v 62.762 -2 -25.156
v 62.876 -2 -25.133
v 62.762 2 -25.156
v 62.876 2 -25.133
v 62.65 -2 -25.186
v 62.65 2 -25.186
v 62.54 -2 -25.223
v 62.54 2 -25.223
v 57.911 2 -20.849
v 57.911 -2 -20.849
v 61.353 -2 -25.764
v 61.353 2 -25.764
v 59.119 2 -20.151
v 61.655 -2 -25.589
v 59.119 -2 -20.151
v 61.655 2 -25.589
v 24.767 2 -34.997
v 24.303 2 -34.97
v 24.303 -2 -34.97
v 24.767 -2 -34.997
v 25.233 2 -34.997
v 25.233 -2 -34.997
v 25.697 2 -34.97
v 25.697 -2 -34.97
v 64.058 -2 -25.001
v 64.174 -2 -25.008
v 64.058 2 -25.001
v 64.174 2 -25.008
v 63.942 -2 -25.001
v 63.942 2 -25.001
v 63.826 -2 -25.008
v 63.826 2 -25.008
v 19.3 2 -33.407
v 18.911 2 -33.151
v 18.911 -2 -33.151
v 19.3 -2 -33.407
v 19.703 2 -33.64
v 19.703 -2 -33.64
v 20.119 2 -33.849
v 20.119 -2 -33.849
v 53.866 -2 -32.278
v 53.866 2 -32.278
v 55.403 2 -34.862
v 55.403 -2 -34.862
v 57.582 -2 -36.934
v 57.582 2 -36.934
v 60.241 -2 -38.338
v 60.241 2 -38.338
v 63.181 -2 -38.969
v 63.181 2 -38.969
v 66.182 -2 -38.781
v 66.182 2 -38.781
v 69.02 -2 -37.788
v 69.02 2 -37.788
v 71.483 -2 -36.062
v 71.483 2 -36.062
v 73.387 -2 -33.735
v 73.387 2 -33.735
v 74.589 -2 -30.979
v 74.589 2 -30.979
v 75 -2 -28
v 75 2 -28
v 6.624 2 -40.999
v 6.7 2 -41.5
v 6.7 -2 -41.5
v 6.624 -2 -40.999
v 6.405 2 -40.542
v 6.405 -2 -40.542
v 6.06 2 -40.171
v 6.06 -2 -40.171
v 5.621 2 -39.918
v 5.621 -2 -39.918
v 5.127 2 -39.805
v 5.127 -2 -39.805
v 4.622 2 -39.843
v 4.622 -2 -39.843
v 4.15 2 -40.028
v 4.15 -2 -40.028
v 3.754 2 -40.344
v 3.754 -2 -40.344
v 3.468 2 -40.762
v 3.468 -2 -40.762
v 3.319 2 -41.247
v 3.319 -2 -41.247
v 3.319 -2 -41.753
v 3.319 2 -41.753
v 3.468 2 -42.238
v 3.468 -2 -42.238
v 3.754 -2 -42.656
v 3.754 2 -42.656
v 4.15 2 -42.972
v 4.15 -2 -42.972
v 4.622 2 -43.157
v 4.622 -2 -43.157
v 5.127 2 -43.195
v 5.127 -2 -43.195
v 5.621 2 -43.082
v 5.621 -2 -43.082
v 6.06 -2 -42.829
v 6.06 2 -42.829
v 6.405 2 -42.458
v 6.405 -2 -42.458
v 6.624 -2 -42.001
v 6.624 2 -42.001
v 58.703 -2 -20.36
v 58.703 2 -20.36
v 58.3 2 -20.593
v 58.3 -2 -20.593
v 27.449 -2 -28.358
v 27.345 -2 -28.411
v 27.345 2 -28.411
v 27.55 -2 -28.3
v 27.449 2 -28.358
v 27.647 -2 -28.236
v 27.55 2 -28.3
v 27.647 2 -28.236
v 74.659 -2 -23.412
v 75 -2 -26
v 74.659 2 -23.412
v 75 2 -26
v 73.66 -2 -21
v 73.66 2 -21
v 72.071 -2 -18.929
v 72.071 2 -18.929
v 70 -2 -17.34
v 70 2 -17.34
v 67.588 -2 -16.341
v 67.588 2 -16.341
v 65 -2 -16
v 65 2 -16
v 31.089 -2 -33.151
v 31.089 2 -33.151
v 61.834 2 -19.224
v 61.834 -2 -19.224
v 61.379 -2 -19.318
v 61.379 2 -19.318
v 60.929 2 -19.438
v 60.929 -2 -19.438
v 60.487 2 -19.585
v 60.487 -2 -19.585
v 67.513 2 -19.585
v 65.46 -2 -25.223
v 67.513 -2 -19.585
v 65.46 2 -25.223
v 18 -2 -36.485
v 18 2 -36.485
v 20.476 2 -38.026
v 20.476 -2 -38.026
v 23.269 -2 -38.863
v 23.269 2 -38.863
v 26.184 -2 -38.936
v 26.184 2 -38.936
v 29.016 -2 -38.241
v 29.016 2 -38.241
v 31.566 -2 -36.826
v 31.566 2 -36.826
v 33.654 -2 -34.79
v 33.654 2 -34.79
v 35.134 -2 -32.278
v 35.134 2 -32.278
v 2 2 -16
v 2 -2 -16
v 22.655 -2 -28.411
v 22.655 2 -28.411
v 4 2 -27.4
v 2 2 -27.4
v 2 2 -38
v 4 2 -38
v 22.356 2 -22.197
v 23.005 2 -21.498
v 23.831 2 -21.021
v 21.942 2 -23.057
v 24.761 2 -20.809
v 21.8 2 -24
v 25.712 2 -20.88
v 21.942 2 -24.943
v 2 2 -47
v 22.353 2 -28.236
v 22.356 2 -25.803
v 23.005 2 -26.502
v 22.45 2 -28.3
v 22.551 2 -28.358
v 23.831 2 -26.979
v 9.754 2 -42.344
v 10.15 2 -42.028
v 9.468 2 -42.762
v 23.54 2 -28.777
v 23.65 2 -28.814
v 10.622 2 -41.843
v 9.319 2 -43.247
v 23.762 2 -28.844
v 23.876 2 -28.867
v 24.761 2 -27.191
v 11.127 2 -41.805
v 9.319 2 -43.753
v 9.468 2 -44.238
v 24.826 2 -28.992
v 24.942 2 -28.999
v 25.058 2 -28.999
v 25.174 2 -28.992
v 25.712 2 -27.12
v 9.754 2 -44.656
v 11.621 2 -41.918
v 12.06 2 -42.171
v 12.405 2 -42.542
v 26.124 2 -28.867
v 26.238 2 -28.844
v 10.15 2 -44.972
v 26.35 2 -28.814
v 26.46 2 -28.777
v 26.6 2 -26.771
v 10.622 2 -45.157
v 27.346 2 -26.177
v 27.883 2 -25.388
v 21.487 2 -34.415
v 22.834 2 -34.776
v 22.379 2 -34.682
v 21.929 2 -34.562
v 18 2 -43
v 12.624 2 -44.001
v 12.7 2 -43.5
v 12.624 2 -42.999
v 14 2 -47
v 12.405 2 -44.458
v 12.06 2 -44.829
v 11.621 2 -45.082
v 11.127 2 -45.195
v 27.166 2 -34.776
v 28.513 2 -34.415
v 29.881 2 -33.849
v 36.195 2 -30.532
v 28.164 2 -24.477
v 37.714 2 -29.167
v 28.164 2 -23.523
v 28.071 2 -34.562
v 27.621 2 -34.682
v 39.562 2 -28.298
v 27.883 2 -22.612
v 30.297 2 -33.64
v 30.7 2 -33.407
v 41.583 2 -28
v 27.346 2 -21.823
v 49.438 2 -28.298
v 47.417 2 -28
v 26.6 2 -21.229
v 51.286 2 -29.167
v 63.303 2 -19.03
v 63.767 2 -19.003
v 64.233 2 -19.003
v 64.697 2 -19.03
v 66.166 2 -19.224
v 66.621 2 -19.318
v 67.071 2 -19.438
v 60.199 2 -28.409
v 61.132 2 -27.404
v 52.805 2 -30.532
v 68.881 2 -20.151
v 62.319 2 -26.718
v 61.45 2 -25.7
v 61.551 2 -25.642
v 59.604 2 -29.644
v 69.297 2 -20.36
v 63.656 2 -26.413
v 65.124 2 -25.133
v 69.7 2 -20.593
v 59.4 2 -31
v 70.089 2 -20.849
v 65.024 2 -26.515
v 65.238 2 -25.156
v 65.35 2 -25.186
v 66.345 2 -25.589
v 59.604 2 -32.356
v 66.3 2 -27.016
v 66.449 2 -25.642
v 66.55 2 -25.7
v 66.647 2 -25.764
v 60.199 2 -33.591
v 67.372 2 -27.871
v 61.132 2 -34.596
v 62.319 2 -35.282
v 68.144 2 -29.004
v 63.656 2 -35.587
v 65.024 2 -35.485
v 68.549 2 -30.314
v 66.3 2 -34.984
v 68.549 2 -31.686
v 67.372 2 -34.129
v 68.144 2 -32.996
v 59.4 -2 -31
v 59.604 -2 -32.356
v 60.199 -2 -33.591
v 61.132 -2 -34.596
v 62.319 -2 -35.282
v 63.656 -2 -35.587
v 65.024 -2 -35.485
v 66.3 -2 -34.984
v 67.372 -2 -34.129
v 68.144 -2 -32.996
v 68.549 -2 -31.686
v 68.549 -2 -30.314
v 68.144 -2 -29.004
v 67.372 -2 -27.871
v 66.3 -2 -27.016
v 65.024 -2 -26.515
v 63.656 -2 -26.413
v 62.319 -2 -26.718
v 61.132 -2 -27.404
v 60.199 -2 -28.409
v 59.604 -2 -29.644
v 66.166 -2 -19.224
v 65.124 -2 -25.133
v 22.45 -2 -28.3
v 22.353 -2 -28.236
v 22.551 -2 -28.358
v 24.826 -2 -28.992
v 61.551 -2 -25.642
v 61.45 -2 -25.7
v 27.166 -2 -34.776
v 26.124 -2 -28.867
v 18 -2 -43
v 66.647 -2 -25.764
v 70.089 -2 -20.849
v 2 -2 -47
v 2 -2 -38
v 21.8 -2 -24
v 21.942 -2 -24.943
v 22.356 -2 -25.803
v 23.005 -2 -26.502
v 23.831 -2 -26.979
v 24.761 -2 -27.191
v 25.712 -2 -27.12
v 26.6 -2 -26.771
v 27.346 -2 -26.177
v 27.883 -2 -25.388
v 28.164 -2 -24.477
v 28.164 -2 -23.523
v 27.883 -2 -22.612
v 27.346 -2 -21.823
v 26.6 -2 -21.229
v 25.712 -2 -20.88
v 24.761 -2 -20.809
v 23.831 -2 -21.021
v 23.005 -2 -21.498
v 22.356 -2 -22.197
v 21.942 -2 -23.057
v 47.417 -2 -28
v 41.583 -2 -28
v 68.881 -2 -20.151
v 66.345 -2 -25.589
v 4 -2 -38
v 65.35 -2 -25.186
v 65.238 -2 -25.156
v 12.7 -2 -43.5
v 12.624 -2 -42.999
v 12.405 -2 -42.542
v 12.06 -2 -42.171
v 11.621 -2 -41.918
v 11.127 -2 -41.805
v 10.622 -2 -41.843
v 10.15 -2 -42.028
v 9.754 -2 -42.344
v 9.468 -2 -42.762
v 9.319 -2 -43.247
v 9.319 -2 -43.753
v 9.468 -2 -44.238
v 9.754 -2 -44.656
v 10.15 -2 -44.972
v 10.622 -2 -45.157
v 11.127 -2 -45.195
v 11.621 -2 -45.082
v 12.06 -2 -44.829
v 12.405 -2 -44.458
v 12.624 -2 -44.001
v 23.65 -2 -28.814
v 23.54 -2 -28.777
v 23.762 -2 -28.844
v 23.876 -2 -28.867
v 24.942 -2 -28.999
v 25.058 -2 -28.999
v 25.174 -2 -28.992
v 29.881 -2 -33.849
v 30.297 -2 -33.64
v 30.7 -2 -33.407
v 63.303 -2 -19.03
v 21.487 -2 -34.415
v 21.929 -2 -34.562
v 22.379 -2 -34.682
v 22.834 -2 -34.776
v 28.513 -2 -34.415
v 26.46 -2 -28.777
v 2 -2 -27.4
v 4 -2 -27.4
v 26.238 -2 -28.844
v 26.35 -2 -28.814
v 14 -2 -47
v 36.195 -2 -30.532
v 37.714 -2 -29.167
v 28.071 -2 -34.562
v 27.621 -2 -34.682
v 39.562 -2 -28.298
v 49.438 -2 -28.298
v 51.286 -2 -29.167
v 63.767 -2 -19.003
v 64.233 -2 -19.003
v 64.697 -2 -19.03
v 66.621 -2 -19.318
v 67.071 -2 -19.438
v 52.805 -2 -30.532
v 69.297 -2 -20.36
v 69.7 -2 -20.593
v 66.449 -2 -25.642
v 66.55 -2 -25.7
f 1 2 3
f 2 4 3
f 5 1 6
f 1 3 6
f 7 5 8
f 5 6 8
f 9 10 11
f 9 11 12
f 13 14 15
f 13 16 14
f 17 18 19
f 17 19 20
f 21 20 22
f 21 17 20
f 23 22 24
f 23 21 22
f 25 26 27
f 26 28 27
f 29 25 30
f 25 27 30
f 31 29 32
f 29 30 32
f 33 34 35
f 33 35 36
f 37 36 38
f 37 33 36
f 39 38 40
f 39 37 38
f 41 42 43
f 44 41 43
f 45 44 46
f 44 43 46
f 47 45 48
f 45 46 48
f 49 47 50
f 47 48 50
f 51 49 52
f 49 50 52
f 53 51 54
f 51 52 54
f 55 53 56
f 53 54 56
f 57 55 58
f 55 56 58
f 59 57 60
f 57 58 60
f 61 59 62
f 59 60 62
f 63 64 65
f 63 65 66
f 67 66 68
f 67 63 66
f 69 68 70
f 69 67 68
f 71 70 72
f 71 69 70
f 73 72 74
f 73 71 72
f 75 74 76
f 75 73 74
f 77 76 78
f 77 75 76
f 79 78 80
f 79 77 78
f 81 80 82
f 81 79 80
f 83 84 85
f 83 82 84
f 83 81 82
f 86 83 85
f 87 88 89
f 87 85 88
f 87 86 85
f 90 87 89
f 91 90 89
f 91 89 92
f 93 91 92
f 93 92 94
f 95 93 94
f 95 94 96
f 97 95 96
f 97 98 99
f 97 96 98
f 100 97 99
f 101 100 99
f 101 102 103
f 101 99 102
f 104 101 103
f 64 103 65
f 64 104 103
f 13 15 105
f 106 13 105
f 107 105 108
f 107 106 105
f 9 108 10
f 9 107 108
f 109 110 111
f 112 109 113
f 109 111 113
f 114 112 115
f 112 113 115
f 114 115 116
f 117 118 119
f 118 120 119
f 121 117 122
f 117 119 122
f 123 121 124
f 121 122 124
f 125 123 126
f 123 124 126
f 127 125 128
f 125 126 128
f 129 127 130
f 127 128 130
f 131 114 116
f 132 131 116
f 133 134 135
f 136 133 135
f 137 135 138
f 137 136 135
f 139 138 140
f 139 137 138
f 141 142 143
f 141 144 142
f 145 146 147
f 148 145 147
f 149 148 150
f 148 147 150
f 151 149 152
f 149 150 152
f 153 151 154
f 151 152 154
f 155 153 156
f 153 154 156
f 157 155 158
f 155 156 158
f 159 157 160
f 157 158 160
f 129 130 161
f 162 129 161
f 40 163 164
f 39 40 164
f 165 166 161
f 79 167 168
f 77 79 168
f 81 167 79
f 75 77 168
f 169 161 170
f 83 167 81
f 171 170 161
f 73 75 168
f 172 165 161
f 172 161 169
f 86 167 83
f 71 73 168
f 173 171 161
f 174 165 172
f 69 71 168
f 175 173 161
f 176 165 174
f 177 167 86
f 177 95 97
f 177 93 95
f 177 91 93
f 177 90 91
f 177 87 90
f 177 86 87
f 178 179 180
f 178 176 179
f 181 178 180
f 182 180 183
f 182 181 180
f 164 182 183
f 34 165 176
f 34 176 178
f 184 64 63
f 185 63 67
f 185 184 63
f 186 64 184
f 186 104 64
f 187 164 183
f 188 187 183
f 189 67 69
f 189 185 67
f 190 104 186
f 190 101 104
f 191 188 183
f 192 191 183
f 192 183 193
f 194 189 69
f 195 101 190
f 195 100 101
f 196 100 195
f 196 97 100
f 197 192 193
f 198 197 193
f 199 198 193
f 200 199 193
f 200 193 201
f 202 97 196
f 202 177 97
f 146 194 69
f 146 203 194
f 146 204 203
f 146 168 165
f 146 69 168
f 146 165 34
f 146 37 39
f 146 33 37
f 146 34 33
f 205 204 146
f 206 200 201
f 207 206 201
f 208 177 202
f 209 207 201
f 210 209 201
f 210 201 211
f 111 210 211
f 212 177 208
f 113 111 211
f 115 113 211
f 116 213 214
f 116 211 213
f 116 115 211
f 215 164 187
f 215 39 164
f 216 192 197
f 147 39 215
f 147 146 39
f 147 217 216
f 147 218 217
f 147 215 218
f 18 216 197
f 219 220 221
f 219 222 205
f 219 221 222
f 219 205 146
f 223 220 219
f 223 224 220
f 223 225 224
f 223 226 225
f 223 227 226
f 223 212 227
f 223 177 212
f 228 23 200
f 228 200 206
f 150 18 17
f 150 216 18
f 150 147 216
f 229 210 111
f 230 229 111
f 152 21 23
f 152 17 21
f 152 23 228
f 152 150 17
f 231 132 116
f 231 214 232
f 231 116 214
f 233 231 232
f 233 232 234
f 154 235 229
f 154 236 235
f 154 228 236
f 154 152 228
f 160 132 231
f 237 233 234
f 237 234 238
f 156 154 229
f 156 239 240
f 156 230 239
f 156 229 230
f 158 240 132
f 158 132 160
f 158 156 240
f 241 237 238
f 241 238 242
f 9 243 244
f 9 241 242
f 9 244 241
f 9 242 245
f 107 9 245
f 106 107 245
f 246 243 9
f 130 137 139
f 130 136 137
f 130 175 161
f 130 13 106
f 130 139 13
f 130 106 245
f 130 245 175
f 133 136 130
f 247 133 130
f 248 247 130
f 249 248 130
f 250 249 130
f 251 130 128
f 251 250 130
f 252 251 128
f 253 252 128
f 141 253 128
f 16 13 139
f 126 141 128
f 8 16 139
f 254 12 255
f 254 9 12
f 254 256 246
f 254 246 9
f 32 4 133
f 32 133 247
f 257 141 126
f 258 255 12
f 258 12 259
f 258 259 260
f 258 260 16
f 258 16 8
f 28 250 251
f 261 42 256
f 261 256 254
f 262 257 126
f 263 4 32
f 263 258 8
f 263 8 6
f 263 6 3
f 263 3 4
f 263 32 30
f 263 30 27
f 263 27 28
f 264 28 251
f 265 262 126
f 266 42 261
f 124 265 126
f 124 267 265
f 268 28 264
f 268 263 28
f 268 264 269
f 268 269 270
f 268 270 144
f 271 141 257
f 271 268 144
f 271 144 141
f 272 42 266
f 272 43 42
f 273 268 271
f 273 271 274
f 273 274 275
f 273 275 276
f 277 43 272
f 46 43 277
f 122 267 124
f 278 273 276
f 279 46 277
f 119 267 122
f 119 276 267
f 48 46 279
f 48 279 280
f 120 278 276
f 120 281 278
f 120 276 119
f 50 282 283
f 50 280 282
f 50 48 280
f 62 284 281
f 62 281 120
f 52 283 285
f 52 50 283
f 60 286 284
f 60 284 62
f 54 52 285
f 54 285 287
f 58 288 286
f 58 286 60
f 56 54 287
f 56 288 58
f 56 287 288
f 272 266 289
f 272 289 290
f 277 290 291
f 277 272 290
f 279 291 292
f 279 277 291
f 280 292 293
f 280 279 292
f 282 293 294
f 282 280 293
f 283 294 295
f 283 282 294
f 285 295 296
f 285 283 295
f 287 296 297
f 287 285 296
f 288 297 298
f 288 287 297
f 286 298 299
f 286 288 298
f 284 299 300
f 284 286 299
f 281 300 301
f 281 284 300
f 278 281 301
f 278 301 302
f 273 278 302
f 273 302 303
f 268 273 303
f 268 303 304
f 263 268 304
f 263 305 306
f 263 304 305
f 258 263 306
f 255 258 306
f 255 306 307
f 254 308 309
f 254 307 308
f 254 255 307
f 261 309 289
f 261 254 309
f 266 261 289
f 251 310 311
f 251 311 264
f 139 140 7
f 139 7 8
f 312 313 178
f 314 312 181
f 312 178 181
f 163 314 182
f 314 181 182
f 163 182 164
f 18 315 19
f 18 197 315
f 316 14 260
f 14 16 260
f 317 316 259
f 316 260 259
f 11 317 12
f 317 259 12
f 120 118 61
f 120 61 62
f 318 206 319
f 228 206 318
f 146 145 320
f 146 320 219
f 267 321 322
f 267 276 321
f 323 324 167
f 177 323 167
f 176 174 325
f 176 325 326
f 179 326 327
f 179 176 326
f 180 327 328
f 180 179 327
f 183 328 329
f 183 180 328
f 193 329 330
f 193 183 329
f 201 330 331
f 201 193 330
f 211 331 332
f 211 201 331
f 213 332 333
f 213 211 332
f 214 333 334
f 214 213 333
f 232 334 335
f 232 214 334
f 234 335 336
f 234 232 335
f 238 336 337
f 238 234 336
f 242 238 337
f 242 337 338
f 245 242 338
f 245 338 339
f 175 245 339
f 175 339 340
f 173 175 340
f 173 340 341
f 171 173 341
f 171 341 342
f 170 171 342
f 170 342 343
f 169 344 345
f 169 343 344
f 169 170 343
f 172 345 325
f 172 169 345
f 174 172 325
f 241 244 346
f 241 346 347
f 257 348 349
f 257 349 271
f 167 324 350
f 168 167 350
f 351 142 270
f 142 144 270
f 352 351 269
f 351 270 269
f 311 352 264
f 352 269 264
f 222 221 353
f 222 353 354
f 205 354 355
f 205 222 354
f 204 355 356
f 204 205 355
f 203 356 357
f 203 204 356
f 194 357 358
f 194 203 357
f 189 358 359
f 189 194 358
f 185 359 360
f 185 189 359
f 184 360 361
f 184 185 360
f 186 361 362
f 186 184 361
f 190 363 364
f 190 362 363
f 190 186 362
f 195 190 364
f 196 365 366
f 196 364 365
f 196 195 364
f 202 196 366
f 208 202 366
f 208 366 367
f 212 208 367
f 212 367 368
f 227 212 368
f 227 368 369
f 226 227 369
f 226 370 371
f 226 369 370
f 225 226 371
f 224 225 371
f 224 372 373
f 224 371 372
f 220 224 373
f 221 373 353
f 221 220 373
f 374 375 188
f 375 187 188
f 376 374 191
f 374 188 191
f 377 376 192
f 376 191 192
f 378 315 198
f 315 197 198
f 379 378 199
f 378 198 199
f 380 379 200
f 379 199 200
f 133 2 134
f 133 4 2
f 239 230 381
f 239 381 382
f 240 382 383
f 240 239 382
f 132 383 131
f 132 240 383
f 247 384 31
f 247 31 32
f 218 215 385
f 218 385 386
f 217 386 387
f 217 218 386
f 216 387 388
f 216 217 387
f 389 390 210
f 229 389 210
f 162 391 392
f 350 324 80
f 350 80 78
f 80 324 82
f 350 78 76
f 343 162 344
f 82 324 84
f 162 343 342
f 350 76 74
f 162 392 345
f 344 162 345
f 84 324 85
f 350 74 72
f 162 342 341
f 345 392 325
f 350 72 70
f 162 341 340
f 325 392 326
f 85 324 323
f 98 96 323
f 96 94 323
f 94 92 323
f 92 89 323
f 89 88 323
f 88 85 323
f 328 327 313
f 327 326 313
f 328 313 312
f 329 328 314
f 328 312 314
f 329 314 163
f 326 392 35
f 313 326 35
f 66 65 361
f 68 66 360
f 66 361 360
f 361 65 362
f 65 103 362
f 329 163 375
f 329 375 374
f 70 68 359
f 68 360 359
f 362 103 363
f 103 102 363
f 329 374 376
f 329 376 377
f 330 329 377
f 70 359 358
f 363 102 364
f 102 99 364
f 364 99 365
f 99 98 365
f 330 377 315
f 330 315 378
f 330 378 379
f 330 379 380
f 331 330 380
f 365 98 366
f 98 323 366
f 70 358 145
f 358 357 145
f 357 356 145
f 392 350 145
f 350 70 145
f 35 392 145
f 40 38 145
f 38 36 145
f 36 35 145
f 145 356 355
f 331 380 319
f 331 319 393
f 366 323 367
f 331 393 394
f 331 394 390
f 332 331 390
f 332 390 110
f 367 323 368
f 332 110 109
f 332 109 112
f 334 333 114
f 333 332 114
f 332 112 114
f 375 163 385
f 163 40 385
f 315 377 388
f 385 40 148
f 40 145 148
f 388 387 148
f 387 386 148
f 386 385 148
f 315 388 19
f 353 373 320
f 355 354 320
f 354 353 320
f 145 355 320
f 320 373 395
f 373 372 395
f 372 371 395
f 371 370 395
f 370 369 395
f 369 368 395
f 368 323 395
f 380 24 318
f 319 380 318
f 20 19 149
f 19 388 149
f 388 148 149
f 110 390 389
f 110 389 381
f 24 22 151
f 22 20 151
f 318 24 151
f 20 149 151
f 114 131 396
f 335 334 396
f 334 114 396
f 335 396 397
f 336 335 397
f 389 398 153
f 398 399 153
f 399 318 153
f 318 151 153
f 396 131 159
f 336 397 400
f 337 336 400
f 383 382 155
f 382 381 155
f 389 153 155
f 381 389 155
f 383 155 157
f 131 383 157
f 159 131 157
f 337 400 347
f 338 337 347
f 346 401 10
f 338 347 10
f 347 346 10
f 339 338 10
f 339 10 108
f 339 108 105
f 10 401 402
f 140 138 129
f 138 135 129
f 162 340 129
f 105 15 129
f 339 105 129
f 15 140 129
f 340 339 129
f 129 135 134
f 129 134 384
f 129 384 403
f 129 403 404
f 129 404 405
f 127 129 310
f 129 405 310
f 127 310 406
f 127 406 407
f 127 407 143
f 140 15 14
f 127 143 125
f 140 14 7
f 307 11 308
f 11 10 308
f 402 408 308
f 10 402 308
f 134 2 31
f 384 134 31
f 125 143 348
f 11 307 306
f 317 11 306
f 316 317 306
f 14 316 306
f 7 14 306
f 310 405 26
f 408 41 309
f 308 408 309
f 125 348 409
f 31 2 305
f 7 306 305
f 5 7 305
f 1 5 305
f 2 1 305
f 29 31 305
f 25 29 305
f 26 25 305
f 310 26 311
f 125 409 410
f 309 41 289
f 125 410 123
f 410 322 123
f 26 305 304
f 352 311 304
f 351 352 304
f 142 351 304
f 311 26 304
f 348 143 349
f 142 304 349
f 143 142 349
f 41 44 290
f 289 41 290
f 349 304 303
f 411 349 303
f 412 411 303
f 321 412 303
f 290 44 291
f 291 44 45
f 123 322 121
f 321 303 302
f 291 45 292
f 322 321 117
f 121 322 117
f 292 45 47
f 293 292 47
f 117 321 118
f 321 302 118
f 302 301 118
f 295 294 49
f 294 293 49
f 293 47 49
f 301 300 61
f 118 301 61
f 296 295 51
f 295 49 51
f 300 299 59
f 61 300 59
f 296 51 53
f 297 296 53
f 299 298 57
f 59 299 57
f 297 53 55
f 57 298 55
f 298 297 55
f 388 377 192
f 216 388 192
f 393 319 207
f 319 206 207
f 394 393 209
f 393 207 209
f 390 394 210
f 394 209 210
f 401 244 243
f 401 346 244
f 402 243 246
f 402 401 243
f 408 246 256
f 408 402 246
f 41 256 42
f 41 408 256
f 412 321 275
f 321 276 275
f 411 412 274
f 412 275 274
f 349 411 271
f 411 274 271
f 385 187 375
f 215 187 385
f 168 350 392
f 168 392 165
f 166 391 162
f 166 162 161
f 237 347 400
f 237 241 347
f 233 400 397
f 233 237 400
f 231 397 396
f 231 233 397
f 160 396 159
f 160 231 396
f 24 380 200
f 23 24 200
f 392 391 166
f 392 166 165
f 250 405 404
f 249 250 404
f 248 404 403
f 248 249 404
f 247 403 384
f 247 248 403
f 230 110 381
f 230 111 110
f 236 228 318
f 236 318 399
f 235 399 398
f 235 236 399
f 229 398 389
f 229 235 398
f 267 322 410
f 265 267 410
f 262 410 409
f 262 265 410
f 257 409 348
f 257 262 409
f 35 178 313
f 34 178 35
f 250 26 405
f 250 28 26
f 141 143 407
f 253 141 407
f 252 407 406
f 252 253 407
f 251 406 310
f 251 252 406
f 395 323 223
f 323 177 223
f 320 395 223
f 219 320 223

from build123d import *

# Parameters (mm, degrees)
BOX001027008_W            = 15
BOX001027008_H            = 24
BOX001027008_DEPTH        = 10.6
CYLINDER055_R             = 1.7
CYLINDER055_DEPTH         = 20
CYLINDER055_ROLL_ANGLE    = 90
CYLINDER054_R             = 1.7
CYLINDER054_DEPTH         = 20
CYLINDER054_ROLL_ANGLE    = 90
BOX001021_W               = 16
BOX001021_H               = 4
BOX001021_DEPTH           = 19
CHAMFER002_SIZE           = 4
BOX001023_W               = 14
BOX001023_H               = 9
BOX001023_DEPTH           = 22
BOX001015_W               = 13
BOX001015_H               = 10
BOX001015_DEPTH           = 2
BOX001015_PLACEMENT_ANGLE = 80
BOX001014_W               = 2
BOX001014_H               = 10
BOX001014_DEPTH           = 13
CYLINDER040_R             = 2
CYLINDER040_DEPTH         = 13
CYLINDER040_ROLL_ANGLE    = 90
CYLINDER041_R             = 8
CYLINDER041_DEPTH         = 8
CYLINDER041_ROLL_ANGLE    = 90
COMMON006_PLACEMENT_ANGLE = 25
COMMON005_PITCH_ANGLE     = -20
COMMON004_PITCH_ANGLE     = 10
COMMON007_PITCH_ANGLE     = -35
COMMON003_PITCH_ANGLE     = -5
FUSION061_PLACEMENT_ANGLE = 180
CYLINDER042_R             = 4.6
CYLINDER042_DEPTH         = 10
CYLINDER042_ROLL_ANGLE    = 90
CYLINDER039_R             = 3.2
CYLINDER039_DEPTH         = 10
CYLINDER039_ROLL_ANGLE    = 90
CYLINDER037_R             = 11
CYLINDER037_DEPTH         = 4
CYLINDER037_ROLL_ANGLE    = 90
CYLINDER038_R             = 11
CYLINDER038_DEPTH         = 4
CYLINDER038_ROLL_ANGLE    = 90
BOX001013_W               = 80
BOX001013_H               = 4
BOX001013_DEPTH           = 12
FILLET_R                  = 7
FILLET001_R               = 7
FILLET002_R               = 10
FILLET002_PLACEMENT_ANGLE = 180


with BuildPart() as cube028:
    # Box001027008 → Box001027008 (new body)
    with BuildSketch(Plane(origin=(-11, -13, -38), x_dir=(1, 0, 0), z_dir=(0, 0, 1))):
        with Locations((7.5, 12)):
            Rectangle(BOX001027008_W, BOX001027008_H)
    extrude(amount=BOX001027008_DEPTH)


with BuildPart() as cylinder055:
    # Cylinder055 → Cylinder055 (new body)
    with BuildSketch(Plane.XY):
        Circle(CYLINDER055_R)
    extrude(amount=CYLINDER055_DEPTH)


with BuildPart() as cylinder055_1:
    # Cylinder055 roll: moved
    add(cylinder055.part.rotate(Axis((0, 0, 0), (1, 0, 0)), CYLINDER055_ROLL_ANGLE))


with BuildPart() as cylinder055_2:
    # Cylinder055 placement: moved
    add(cylinder055_1.part.moved(Location((5, 10, -41.5))))


with BuildPart() as fusion075:
    # Cylinder054 → Cylinder054 (new body)
    with BuildSketch(Plane.XY):
        Circle(CYLINDER054_R)
    extrude(amount=CYLINDER054_DEPTH)


with BuildPart() as fusion075_1:
    # Cylinder054 roll: moved
    add(fusion075.part.rotate(Axis((0, 0, 0), (1, 0, 0)), CYLINDER054_ROLL_ANGLE))


with BuildPart() as fusion075_2:
    # Cylinder054 placement: moved
    add(fusion075_1.part.moved(Location((11, 10, -43.5))))

    # Fusion075: union Cylinder055
    add(cylinder055_2.part)


with BuildPart() as cut031:
    # Box001021 → Box001021 (new body)
    with BuildSketch(Plane(origin=(2, -2, -47), x_dir=(1, 0, 0), z_dir=(0, 0, 1))):
        with Locations((8, 2)):
            Rectangle(BOX001021_W, BOX001021_H)
    extrude(amount=BOX001021_DEPTH)

    # Chamfer002
    chamfer002_edges = [cut031.edges().sort_by_distance(p)[0] for p in [
        (18, 0, -47),
    ]]
    chamfer(chamfer002_edges, length=CHAMFER002_SIZE)

    # Cut031: cut Fusion075
    add(fusion075_2.part, mode=Mode.SUBTRACT)


with BuildPart() as cube021:
    # Box001023 → Box001023 (new body)
    with BuildSketch(Plane(origin=(-12, -4, -33), x_dir=(1, 0, 0), z_dir=(0, 0, 1))):
        with Locations((7, 4.5)):
            Rectangle(BOX001023_W, BOX001023_H)
    extrude(amount=BOX001023_DEPTH)


with BuildPart() as cube013:
    # Box001015 → Box001015 (new body)
    with BuildSketch(Plane.XY):
        with Locations((6.5, 5)):
            Rectangle(BOX001015_W, BOX001015_H)
    extrude(amount=BOX001015_DEPTH)


with BuildPart() as cube013_1:
    # Box001015 placement: moved
    add(cube013.part.moved(Location((0, -5, 0))).rotate(Axis((0, -5, 0), (0, -1, 0)), BOX001015_PLACEMENT_ANGLE))


with BuildPart() as common002:
    # Box001014 → Box001014 (new body)
    with BuildSketch(Plane(origin=(0, -5, 0), x_dir=(1, 0, 0), z_dir=(0, 0, 1))):
        with Locations((1, 5)):
            Rectangle(BOX001014_W, BOX001014_H)
    extrude(amount=BOX001014_DEPTH)

    # Common002: intersect Cube013
    add(cube013_1.part, mode=Mode.INTERSECT)


with BuildPart() as cylinder040:
    # Cylinder040 → Cylinder040 (new body)
    with BuildSketch(Plane.XY):
        Circle(CYLINDER040_R)
    extrude(amount=CYLINDER040_DEPTH)


with BuildPart() as cylinder040_1:
    # Cylinder040 roll: moved
    add(cylinder040.part.rotate(Axis((0, 0, 0), (1, 0, 0)), CYLINDER040_ROLL_ANGLE))


with BuildPart() as cylinder040_2:
    # Cylinder040 placement: moved
    add(cylinder040_1.part.moved(Location((0, 7, 0))))


with BuildPart() as cut010:
    # Cylinder041 → Cylinder041 (new body)
    with BuildSketch(Plane.XY):
        Circle(CYLINDER041_R)
    extrude(amount=CYLINDER041_DEPTH)


with BuildPart() as cut010_1:
    # Cylinder041 roll: moved
    add(cut010.part.rotate(Axis((0, 0, 0), (1, 0, 0)), CYLINDER041_ROLL_ANGLE))


with BuildPart() as cut010_2:
    # Cylinder041 placement: moved
    add(cut010_1.part.moved(Location((0, 4, 0))))

    # Cut010: cut Cylinder040
    add(cylinder040_2.part, mode=Mode.SUBTRACT)


with BuildPart() as common006:
    # Common006 base: copy of Cut010
    add(cut010_2.part)

    # Common006: intersect Common002
    add(common002.part, mode=Mode.INTERSECT)


with BuildPart() as common006_1:
    # Common006 placement: moved
    add(common006.part.moved(Location((51.5, 0, 10.598076))).rotate(Axis((51.5, 0, 10.598076), (0, 1, 0)), COMMON006_PLACEMENT_ANGLE))


with BuildPart() as common005:
    # Common005 base: copy of Cut010
    add(cut010_2.part)

    # Common005: intersect Common002
    add(common002.part, mode=Mode.INTERSECT)


with BuildPart() as common005_1:
    # Common005 pitch: moved
    add(common005.part.rotate(Axis((0, 0, 0), (0, 1, 0)), COMMON005_PITCH_ANGLE))


with BuildPart() as common005_2:
    # Common005 placement: moved
    add(common005_1.part.moved(Location((49.223543, 0, 10.897777))))


with BuildPart() as common004:
    # Common004 base: copy of Cut010
    add(cut010_2.part)

    # Common004: intersect Common002
    add(common002.part, mode=Mode.INTERSECT)


with BuildPart() as common004_1:
    # Common004 pitch: moved
    add(common004.part.rotate(Axis((0, 0, 0), (0, 1, 0)), COMMON004_PITCH_ANGLE))


with BuildPart() as common004_2:
    # Common004 placement: moved
    add(common004_1.part.moved(Location((50.776457, 0, 10.897777))))


with BuildPart() as common007:
    # Common007 base: copy of Cut010
    add(cut010_2.part)

    # Common007: intersect Common002
    add(common002.part, mode=Mode.INTERSECT)


with BuildPart() as common007_1:
    # Common007 pitch: moved
    add(common007.part.rotate(Axis((0, 0, 0), (0, 1, 0)), COMMON007_PITCH_ANGLE))


with BuildPart() as common007_2:
    # Common007 placement: moved
    add(common007_1.part.moved(Location((48.5, 0, 10.598076))))


with BuildPart() as common003:
    # Common003 base: copy of Cut010
    add(cut010_2.part)

    # Common003: intersect Common002
    add(common002.part, mode=Mode.INTERSECT)


with BuildPart() as common003_1:
    # Common003 pitch: moved
    add(common003.part.rotate(Axis((0, 0, 0), (0, 1, 0)), COMMON003_PITCH_ANGLE))


with BuildPart() as common003_2:
    # Common003 placement: moved
    add(common003_1.part.moved(Location((50, 0, 11))))


with BuildPart() as strength_slots001:
    # Fusion061 base: copy of Common003
    add(common003_2.part)

    # Fusion061: union Common006, Common005, Common004, Common007
    add(common006_1.part)
    add(common005_2.part)
    add(common004_2.part)
    add(common007_2.part)


with BuildPart() as strength_slots001_1:
    # Fusion061 placement: moved
    add(strength_slots001.part.moved(Location((61, 0, 22))).rotate(Axis((61, 0, 22), (0, 1, 0)), FUSION061_PLACEMENT_ANGLE))


with BuildPart() as cylinder042:
    # Cylinder042 → Cylinder042 (new body)
    with BuildSketch(Plane.XY):
        Circle(CYLINDER042_R)
    extrude(amount=CYLINDER042_DEPTH)


with BuildPart() as cylinder042_1:
    # Cylinder042 roll: moved
    add(cylinder042.part.rotate(Axis((0, 0, 0), (1, 0, 0)), CYLINDER042_ROLL_ANGLE))


with BuildPart() as cylinder042_2:
    # Cylinder042 placement: moved
    add(cylinder042_1.part.moved(Location((11, 5, 15))))


with BuildPart() as strength_slots:
    # Fusion060 base: copy of Common003
    add(common003_2.part)

    # Fusion060: union Common006, Common005, Common004, Common007
    add(common006_1.part)
    add(common005_2.part)
    add(common004_2.part)
    add(common007_2.part)


with BuildPart() as cylinder039:
    # Cylinder039 → Cylinder039 (new body)
    with BuildSketch(Plane.XY):
        Circle(CYLINDER039_R)
    extrude(amount=CYLINDER039_DEPTH)


with BuildPart() as cylinder039_1:
    # Cylinder039 roll: moved
    add(cylinder039.part.rotate(Axis((0, 0, 0), (1, 0, 0)), CYLINDER039_ROLL_ANGLE))


with BuildPart() as cylinder039_2:
    # Cylinder039 placement: moved
    add(cylinder039_1.part.moved(Location((50, 5, 8))))


with BuildPart() as cylinder037:
    # Cylinder037 → Cylinder037 (new body)
    with BuildSketch(Plane.XY):
        Circle(CYLINDER037_R)
    extrude(amount=CYLINDER037_DEPTH)


with BuildPart() as cylinder037_1:
    # Cylinder037 roll: moved
    add(cylinder037.part.rotate(Axis((0, 0, 0), (1, 0, 0)), CYLINDER037_ROLL_ANGLE))


with BuildPart() as cylinder037_2:
    # Cylinder037 placement: moved
    add(cylinder037_1.part.moved(Location((11, 2, 12))))


with BuildPart() as cylinder038:
    # Cylinder038 → Cylinder038 (new body)
    with BuildSketch(Plane.XY):
        Circle(CYLINDER038_R)
    extrude(amount=CYLINDER038_DEPTH)


with BuildPart() as cylinder038_1:
    # Cylinder038 roll: moved
    add(cylinder038.part.rotate(Axis((0, 0, 0), (1, 0, 0)), CYLINDER038_ROLL_ANGLE))


with BuildPart() as cylinder038_2:
    # Cylinder038 placement: moved
    add(cylinder038_1.part.moved(Location((50, 2, 12))))


with BuildPart() as cut_lever_x:
    # Box001013 → Box001013 (new body)
    with BuildSketch(Plane(origin=(0, -2, 0), x_dir=(1, 0, 0), z_dir=(0, 0, 1))):
        with Locations((40, 2)):
            Rectangle(BOX001013_W, BOX001013_H)
    extrude(amount=BOX001013_DEPTH)

    # Fusion059: union Cylinder037, Cylinder038
    add(cylinder037_2.part)
    add(cylinder038_2.part)

    # Fillet
    fillet_edges = [cut_lever_x.edges().sort_by_distance(p)[0] for p in [
        (22, 0, 12),
    ]]
    fillet(fillet_edges, radius=FILLET_R)

    # Fillet001
    fillet001_edges = [cut_lever_x.edges().sort_by_distance(p)[0] for p in [
        (39, 0, 12),
        (61, 0, 12),
    ]]
    fillet(fillet001_edges, radius=FILLET001_R)

    # Cut009: cut Cylinder039
    add(cylinder039_2.part, mode=Mode.SUBTRACT)

    # Cut011: cut strength-slots
    add(strength_slots.part, mode=Mode.SUBTRACT)

    # Cut012: cut Cylinder042
    add(cylinder042_2.part, mode=Mode.SUBTRACT)

    # Cut013: cut strength-slots001
    add(strength_slots001_1.part, mode=Mode.SUBTRACT)

    # Fillet002
    fillet002_edges = [cut_lever_x.edges().sort_by_distance(p)[0] for p in [
        (0, 0, 0),
    ]]
    fillet(fillet002_edges, radius=FILLET002_R)


with BuildPart() as cut_lever_x_1:
    # Fillet002 placement: moved
    add(cut_lever_x.part.moved(Location((75, 0, -16))).rotate(Axis((75, 0, -16), (0, 1, 0)), FILLET002_PLACEMENT_ANGLE))

    # Cut021: cut Cube021
    add(cube021.part, mode=Mode.SUBTRACT)

    # Fusion076: union Cut031
    add(cut031.part)

    # Cut039: cut Cube028
    add(cube028.part, mode=Mode.SUBTRACT)


solid = cut_lever_x_1.part
